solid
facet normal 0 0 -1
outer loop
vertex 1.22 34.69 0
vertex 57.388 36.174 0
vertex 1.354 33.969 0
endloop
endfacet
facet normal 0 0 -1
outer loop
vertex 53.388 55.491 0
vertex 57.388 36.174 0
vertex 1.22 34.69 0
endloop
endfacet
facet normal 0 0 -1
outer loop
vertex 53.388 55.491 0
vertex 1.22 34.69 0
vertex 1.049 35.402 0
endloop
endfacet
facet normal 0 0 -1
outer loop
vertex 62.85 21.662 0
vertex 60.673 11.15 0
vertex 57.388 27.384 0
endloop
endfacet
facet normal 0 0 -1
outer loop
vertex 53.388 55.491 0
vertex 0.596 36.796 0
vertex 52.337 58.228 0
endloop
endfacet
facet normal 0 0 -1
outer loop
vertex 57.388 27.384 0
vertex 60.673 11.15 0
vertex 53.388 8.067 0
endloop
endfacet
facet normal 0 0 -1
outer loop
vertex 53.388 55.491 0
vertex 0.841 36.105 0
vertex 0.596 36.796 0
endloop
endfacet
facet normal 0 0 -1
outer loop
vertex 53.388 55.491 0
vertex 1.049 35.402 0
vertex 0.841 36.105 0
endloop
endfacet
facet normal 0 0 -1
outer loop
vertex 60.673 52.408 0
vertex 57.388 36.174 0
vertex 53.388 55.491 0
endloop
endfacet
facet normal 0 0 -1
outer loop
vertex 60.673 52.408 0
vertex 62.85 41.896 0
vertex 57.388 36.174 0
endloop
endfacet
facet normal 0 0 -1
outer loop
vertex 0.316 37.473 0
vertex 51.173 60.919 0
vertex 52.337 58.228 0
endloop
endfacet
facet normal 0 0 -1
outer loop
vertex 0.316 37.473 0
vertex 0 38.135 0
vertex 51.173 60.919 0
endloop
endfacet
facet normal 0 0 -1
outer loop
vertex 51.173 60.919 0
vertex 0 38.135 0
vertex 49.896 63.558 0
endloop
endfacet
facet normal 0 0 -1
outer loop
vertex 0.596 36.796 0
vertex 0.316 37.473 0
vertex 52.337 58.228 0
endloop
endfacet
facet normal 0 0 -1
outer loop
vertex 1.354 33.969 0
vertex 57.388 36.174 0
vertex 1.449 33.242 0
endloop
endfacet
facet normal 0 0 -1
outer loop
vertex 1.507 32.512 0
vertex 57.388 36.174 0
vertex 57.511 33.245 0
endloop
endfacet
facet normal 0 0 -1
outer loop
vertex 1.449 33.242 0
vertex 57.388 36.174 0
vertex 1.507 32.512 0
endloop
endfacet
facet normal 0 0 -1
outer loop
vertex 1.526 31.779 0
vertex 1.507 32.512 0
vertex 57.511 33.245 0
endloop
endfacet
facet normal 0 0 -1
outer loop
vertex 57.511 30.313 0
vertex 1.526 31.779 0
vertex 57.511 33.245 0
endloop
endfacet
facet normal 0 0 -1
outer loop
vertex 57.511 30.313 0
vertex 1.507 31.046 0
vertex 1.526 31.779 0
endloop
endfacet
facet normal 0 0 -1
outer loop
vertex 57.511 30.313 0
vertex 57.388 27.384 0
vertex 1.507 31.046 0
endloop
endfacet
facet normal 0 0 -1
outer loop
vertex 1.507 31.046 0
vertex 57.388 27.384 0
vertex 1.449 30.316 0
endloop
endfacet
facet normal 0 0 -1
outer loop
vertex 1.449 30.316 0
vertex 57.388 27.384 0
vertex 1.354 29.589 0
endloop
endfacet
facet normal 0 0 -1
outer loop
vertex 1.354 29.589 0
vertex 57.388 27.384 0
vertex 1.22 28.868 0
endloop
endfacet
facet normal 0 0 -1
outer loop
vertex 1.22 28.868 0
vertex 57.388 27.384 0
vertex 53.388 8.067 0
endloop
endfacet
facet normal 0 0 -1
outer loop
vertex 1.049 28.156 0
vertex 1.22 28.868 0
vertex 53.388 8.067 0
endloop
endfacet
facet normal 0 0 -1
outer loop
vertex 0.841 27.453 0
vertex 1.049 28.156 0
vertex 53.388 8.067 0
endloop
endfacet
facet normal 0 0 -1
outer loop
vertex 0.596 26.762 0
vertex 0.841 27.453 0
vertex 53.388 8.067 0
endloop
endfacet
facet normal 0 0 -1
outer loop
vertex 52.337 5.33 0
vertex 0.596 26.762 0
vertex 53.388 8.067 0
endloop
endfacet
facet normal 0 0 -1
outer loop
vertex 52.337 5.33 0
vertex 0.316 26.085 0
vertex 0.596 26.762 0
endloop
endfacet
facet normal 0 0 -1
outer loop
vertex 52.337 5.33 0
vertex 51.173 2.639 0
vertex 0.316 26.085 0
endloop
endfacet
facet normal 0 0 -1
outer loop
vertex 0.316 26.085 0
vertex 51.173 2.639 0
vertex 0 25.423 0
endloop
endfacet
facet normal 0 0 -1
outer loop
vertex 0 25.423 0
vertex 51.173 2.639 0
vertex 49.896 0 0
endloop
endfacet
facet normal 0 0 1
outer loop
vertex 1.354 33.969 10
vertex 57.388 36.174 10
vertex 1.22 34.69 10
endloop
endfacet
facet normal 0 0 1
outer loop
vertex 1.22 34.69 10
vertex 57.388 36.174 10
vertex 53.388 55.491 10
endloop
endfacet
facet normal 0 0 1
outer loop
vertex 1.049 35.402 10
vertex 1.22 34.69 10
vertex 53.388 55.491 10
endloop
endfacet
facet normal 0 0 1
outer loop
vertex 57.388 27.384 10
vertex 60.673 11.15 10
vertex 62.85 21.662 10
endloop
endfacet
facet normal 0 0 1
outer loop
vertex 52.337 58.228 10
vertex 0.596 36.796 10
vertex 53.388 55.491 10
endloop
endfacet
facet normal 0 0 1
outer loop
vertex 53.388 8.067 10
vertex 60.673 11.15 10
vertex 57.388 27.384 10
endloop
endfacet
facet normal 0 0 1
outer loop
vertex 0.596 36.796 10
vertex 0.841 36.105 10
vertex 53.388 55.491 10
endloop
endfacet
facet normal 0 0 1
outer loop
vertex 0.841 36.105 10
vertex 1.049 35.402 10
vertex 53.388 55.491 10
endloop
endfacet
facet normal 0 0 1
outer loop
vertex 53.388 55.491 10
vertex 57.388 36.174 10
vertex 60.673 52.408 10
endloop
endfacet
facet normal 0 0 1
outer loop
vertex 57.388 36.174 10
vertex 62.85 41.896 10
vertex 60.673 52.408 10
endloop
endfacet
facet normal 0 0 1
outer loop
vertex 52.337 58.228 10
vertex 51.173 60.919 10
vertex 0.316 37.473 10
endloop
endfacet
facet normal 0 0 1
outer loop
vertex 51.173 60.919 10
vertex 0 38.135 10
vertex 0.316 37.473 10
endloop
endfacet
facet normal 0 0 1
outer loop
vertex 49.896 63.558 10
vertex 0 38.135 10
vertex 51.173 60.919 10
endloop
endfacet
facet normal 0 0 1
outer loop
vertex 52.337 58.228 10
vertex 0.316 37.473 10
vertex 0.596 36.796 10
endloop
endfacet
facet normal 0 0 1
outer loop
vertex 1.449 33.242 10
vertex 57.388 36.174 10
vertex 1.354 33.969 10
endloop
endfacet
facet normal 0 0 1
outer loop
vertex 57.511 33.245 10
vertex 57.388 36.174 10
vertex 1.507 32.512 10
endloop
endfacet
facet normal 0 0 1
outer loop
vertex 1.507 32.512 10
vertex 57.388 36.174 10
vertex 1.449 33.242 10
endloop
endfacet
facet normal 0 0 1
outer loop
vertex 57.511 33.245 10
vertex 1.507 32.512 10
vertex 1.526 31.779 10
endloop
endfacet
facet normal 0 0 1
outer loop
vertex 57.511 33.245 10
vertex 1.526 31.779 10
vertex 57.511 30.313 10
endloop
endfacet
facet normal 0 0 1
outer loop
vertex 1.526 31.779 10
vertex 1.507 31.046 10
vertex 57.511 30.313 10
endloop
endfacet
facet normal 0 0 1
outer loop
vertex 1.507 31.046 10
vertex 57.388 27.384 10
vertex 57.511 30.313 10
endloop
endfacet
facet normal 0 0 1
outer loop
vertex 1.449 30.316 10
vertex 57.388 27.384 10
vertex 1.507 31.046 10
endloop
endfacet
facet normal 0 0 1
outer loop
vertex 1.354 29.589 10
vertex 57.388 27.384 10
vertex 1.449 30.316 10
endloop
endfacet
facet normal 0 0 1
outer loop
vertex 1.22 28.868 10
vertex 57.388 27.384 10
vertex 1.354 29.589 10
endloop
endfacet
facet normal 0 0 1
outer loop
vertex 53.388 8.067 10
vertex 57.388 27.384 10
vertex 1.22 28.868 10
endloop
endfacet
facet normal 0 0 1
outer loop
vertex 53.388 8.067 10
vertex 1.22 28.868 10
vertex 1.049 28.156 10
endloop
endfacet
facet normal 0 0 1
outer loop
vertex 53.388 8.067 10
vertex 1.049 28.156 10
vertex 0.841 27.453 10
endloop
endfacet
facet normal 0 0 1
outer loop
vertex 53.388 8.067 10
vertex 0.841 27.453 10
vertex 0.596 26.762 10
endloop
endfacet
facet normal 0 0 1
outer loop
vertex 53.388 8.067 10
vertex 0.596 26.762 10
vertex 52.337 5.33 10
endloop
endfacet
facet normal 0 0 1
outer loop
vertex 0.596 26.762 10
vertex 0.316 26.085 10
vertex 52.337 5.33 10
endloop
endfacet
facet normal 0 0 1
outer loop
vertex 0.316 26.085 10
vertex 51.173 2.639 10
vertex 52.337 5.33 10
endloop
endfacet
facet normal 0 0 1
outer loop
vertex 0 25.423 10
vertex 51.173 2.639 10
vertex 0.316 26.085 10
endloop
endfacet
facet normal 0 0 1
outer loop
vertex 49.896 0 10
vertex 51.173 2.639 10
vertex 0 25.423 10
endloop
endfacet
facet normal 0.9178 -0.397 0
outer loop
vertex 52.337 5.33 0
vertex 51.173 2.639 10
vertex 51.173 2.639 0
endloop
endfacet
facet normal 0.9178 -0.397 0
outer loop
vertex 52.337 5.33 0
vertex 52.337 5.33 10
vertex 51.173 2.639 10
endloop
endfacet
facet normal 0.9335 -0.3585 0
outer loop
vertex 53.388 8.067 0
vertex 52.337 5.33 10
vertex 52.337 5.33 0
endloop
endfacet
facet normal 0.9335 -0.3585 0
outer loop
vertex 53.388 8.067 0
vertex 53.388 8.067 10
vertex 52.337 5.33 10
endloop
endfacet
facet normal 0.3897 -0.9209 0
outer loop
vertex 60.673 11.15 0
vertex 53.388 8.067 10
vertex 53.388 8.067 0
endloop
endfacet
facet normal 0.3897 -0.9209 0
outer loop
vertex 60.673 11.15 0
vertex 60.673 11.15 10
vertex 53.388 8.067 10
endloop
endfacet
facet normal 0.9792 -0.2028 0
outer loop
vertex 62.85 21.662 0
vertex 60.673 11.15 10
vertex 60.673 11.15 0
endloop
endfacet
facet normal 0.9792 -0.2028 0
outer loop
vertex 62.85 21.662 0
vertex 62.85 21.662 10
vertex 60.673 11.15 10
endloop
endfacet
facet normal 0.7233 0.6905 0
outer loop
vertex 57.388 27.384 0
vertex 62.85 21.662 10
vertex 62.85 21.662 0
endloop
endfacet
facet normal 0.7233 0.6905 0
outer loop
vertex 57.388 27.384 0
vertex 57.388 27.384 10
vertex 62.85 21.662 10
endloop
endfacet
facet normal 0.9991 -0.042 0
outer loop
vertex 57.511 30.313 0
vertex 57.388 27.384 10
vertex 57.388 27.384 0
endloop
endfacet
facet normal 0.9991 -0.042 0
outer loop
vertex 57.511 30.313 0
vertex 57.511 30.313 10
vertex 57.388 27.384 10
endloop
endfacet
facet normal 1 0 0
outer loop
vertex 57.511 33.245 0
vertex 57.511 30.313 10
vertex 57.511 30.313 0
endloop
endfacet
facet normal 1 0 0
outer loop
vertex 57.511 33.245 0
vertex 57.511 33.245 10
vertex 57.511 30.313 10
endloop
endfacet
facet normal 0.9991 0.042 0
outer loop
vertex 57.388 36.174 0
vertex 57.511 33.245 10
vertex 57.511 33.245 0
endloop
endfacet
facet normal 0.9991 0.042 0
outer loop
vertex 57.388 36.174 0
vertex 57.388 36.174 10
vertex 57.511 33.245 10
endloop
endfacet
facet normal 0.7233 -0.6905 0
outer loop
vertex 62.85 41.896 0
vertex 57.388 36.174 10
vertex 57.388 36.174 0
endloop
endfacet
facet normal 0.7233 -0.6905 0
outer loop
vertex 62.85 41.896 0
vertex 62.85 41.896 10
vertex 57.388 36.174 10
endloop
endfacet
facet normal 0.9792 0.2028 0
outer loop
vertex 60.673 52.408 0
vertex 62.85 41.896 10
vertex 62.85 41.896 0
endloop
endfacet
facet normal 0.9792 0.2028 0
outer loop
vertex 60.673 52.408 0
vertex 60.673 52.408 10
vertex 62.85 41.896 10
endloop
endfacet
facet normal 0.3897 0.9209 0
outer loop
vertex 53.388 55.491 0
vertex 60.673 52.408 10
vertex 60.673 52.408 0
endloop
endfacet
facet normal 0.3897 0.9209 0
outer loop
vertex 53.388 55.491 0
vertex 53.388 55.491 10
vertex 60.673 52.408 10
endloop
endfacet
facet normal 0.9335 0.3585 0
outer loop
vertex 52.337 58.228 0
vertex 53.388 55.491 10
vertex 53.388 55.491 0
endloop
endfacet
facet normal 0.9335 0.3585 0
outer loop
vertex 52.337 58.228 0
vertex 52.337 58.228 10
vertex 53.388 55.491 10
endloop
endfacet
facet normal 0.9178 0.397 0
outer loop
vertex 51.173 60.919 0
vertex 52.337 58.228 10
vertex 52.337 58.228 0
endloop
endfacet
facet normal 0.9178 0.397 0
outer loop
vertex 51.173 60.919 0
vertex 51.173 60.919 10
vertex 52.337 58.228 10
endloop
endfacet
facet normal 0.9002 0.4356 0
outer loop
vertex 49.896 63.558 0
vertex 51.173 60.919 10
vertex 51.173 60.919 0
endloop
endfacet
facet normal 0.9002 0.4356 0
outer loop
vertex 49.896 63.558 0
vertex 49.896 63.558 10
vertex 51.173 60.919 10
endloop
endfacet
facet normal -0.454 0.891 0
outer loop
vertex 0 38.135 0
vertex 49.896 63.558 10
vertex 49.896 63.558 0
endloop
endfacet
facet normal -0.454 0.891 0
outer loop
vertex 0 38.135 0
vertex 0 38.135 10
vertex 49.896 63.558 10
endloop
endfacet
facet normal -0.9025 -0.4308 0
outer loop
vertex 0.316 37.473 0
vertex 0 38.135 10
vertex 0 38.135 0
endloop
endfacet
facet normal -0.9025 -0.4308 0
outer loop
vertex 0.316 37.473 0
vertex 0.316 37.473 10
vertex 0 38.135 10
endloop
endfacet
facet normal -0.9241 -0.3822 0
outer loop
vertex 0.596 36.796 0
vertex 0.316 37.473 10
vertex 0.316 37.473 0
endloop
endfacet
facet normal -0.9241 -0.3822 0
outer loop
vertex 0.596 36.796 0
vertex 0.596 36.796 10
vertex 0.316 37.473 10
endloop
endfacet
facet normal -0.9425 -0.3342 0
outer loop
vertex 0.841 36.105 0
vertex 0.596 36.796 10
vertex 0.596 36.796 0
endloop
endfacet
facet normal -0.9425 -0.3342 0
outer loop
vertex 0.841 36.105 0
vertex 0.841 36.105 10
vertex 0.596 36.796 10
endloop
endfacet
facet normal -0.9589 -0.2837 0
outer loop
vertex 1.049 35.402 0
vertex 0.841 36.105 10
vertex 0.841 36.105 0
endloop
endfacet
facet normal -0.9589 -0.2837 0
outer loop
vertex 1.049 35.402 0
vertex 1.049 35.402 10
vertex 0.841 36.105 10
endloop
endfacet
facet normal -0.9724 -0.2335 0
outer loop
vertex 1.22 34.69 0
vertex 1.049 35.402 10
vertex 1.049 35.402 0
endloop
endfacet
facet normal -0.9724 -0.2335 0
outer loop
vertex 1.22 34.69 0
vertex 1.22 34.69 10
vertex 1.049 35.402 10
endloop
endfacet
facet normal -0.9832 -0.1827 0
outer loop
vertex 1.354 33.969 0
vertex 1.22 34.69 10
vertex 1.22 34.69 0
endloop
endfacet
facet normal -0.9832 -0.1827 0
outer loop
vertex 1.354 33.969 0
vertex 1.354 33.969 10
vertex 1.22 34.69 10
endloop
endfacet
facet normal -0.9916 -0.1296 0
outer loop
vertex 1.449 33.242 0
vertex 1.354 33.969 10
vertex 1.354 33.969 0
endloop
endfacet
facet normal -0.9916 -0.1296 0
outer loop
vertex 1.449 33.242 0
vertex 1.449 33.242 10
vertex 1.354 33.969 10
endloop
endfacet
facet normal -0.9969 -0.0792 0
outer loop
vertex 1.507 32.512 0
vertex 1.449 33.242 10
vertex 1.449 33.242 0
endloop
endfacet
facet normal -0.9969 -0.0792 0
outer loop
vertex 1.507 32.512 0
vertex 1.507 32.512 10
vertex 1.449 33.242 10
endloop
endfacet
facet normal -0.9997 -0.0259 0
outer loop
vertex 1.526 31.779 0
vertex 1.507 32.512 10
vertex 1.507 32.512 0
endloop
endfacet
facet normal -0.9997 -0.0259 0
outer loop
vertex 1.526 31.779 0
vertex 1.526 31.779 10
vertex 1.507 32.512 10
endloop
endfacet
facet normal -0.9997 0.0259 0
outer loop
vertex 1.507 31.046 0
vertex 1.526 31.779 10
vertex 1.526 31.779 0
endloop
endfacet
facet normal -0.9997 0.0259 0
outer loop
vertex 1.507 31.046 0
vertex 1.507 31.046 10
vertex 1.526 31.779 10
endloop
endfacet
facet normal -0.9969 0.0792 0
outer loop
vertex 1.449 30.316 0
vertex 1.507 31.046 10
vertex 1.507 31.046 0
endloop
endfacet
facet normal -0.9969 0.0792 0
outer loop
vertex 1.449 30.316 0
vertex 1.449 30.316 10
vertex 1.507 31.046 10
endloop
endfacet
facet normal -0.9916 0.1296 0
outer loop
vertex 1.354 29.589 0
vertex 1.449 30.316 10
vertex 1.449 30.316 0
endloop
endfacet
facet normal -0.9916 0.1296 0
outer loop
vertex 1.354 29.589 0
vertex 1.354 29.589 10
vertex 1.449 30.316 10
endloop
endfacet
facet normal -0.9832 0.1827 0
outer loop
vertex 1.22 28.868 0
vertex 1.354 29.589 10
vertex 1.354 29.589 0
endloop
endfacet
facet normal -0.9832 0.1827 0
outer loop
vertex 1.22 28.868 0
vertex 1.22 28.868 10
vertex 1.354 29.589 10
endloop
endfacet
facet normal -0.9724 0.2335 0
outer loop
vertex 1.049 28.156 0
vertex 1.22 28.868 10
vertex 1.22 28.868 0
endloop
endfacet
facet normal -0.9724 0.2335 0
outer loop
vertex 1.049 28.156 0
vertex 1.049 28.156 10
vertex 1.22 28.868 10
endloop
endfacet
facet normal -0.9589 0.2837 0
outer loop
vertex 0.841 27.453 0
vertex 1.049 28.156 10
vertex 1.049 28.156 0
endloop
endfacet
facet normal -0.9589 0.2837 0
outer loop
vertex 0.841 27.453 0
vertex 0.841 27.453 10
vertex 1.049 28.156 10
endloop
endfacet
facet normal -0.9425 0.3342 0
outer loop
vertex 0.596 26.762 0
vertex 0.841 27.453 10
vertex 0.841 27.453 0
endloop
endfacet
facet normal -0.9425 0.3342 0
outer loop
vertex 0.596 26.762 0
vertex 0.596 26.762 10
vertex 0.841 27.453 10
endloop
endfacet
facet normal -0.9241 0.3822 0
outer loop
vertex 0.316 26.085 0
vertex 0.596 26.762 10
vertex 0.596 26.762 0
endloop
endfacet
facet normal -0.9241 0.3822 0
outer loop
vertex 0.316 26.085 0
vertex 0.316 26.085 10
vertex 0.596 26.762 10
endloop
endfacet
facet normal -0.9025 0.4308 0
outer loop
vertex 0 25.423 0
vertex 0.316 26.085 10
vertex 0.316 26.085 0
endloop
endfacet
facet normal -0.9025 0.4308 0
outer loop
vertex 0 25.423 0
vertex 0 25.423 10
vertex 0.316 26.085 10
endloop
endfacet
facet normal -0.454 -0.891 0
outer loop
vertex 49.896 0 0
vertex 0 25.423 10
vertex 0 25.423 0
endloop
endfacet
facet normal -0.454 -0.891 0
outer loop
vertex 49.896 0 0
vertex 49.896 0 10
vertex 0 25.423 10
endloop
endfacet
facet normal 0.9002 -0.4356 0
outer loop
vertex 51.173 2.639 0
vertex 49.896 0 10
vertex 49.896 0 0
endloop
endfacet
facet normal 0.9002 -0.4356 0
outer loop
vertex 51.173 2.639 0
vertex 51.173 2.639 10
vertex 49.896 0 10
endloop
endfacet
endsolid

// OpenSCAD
$fn = 32;

// ----------------------------------------------------------------------
// Gear sector: 2 teeth on 54 degrees
// ----------------------------------------------------------------------

// --- parameters (mm) ---
sector_angle = 54;        // sector angle, degrees
root_r = 70;              // root circle radius
tooth_h = 6;              // tooth height over the root circle
teeth = 2;                // number of teeth on the sector
hub_r = 14;               // hub bore radius
plate_t = 10;             // sector thickness, Z
arc_step = 3;             // sampling step of the root/hub arcs, degrees

tip_r = root_r + tooth_h;  // tip circle radius

profile = [[49.896, 0], [51.173, 2.639], [52.337, 5.33], [53.388, 8.067], [60.673, 11.15], [62.85, 21.662], [57.388, 27.384], [57.511, 30.313], [57.511, 33.245], [57.388, 36.174], [62.85, 41.896], [60.673, 52.408], [53.388, 55.491], [52.337, 58.228], [51.173, 60.919], [49.896, 63.558], [0, 38.135], [0.316, 37.473], [0.596, 36.796], [0.841, 36.105], [1.049, 35.402], [1.22, 34.69], [1.354, 33.969], [1.449, 33.242], [1.507, 32.512], [1.526, 31.779], [1.507, 31.046], [1.449, 30.316], [1.354, 29.589], [1.22, 28.868], [1.049, 28.156], [0.841, 27.453], [0.596, 26.762], [0.316, 26.085], [0, 25.423]];  // primary outline, 35 points, counter clockwise

// --- the one profile operation ---
linear_extrude(height = plate_t) polygon(points = profile);
